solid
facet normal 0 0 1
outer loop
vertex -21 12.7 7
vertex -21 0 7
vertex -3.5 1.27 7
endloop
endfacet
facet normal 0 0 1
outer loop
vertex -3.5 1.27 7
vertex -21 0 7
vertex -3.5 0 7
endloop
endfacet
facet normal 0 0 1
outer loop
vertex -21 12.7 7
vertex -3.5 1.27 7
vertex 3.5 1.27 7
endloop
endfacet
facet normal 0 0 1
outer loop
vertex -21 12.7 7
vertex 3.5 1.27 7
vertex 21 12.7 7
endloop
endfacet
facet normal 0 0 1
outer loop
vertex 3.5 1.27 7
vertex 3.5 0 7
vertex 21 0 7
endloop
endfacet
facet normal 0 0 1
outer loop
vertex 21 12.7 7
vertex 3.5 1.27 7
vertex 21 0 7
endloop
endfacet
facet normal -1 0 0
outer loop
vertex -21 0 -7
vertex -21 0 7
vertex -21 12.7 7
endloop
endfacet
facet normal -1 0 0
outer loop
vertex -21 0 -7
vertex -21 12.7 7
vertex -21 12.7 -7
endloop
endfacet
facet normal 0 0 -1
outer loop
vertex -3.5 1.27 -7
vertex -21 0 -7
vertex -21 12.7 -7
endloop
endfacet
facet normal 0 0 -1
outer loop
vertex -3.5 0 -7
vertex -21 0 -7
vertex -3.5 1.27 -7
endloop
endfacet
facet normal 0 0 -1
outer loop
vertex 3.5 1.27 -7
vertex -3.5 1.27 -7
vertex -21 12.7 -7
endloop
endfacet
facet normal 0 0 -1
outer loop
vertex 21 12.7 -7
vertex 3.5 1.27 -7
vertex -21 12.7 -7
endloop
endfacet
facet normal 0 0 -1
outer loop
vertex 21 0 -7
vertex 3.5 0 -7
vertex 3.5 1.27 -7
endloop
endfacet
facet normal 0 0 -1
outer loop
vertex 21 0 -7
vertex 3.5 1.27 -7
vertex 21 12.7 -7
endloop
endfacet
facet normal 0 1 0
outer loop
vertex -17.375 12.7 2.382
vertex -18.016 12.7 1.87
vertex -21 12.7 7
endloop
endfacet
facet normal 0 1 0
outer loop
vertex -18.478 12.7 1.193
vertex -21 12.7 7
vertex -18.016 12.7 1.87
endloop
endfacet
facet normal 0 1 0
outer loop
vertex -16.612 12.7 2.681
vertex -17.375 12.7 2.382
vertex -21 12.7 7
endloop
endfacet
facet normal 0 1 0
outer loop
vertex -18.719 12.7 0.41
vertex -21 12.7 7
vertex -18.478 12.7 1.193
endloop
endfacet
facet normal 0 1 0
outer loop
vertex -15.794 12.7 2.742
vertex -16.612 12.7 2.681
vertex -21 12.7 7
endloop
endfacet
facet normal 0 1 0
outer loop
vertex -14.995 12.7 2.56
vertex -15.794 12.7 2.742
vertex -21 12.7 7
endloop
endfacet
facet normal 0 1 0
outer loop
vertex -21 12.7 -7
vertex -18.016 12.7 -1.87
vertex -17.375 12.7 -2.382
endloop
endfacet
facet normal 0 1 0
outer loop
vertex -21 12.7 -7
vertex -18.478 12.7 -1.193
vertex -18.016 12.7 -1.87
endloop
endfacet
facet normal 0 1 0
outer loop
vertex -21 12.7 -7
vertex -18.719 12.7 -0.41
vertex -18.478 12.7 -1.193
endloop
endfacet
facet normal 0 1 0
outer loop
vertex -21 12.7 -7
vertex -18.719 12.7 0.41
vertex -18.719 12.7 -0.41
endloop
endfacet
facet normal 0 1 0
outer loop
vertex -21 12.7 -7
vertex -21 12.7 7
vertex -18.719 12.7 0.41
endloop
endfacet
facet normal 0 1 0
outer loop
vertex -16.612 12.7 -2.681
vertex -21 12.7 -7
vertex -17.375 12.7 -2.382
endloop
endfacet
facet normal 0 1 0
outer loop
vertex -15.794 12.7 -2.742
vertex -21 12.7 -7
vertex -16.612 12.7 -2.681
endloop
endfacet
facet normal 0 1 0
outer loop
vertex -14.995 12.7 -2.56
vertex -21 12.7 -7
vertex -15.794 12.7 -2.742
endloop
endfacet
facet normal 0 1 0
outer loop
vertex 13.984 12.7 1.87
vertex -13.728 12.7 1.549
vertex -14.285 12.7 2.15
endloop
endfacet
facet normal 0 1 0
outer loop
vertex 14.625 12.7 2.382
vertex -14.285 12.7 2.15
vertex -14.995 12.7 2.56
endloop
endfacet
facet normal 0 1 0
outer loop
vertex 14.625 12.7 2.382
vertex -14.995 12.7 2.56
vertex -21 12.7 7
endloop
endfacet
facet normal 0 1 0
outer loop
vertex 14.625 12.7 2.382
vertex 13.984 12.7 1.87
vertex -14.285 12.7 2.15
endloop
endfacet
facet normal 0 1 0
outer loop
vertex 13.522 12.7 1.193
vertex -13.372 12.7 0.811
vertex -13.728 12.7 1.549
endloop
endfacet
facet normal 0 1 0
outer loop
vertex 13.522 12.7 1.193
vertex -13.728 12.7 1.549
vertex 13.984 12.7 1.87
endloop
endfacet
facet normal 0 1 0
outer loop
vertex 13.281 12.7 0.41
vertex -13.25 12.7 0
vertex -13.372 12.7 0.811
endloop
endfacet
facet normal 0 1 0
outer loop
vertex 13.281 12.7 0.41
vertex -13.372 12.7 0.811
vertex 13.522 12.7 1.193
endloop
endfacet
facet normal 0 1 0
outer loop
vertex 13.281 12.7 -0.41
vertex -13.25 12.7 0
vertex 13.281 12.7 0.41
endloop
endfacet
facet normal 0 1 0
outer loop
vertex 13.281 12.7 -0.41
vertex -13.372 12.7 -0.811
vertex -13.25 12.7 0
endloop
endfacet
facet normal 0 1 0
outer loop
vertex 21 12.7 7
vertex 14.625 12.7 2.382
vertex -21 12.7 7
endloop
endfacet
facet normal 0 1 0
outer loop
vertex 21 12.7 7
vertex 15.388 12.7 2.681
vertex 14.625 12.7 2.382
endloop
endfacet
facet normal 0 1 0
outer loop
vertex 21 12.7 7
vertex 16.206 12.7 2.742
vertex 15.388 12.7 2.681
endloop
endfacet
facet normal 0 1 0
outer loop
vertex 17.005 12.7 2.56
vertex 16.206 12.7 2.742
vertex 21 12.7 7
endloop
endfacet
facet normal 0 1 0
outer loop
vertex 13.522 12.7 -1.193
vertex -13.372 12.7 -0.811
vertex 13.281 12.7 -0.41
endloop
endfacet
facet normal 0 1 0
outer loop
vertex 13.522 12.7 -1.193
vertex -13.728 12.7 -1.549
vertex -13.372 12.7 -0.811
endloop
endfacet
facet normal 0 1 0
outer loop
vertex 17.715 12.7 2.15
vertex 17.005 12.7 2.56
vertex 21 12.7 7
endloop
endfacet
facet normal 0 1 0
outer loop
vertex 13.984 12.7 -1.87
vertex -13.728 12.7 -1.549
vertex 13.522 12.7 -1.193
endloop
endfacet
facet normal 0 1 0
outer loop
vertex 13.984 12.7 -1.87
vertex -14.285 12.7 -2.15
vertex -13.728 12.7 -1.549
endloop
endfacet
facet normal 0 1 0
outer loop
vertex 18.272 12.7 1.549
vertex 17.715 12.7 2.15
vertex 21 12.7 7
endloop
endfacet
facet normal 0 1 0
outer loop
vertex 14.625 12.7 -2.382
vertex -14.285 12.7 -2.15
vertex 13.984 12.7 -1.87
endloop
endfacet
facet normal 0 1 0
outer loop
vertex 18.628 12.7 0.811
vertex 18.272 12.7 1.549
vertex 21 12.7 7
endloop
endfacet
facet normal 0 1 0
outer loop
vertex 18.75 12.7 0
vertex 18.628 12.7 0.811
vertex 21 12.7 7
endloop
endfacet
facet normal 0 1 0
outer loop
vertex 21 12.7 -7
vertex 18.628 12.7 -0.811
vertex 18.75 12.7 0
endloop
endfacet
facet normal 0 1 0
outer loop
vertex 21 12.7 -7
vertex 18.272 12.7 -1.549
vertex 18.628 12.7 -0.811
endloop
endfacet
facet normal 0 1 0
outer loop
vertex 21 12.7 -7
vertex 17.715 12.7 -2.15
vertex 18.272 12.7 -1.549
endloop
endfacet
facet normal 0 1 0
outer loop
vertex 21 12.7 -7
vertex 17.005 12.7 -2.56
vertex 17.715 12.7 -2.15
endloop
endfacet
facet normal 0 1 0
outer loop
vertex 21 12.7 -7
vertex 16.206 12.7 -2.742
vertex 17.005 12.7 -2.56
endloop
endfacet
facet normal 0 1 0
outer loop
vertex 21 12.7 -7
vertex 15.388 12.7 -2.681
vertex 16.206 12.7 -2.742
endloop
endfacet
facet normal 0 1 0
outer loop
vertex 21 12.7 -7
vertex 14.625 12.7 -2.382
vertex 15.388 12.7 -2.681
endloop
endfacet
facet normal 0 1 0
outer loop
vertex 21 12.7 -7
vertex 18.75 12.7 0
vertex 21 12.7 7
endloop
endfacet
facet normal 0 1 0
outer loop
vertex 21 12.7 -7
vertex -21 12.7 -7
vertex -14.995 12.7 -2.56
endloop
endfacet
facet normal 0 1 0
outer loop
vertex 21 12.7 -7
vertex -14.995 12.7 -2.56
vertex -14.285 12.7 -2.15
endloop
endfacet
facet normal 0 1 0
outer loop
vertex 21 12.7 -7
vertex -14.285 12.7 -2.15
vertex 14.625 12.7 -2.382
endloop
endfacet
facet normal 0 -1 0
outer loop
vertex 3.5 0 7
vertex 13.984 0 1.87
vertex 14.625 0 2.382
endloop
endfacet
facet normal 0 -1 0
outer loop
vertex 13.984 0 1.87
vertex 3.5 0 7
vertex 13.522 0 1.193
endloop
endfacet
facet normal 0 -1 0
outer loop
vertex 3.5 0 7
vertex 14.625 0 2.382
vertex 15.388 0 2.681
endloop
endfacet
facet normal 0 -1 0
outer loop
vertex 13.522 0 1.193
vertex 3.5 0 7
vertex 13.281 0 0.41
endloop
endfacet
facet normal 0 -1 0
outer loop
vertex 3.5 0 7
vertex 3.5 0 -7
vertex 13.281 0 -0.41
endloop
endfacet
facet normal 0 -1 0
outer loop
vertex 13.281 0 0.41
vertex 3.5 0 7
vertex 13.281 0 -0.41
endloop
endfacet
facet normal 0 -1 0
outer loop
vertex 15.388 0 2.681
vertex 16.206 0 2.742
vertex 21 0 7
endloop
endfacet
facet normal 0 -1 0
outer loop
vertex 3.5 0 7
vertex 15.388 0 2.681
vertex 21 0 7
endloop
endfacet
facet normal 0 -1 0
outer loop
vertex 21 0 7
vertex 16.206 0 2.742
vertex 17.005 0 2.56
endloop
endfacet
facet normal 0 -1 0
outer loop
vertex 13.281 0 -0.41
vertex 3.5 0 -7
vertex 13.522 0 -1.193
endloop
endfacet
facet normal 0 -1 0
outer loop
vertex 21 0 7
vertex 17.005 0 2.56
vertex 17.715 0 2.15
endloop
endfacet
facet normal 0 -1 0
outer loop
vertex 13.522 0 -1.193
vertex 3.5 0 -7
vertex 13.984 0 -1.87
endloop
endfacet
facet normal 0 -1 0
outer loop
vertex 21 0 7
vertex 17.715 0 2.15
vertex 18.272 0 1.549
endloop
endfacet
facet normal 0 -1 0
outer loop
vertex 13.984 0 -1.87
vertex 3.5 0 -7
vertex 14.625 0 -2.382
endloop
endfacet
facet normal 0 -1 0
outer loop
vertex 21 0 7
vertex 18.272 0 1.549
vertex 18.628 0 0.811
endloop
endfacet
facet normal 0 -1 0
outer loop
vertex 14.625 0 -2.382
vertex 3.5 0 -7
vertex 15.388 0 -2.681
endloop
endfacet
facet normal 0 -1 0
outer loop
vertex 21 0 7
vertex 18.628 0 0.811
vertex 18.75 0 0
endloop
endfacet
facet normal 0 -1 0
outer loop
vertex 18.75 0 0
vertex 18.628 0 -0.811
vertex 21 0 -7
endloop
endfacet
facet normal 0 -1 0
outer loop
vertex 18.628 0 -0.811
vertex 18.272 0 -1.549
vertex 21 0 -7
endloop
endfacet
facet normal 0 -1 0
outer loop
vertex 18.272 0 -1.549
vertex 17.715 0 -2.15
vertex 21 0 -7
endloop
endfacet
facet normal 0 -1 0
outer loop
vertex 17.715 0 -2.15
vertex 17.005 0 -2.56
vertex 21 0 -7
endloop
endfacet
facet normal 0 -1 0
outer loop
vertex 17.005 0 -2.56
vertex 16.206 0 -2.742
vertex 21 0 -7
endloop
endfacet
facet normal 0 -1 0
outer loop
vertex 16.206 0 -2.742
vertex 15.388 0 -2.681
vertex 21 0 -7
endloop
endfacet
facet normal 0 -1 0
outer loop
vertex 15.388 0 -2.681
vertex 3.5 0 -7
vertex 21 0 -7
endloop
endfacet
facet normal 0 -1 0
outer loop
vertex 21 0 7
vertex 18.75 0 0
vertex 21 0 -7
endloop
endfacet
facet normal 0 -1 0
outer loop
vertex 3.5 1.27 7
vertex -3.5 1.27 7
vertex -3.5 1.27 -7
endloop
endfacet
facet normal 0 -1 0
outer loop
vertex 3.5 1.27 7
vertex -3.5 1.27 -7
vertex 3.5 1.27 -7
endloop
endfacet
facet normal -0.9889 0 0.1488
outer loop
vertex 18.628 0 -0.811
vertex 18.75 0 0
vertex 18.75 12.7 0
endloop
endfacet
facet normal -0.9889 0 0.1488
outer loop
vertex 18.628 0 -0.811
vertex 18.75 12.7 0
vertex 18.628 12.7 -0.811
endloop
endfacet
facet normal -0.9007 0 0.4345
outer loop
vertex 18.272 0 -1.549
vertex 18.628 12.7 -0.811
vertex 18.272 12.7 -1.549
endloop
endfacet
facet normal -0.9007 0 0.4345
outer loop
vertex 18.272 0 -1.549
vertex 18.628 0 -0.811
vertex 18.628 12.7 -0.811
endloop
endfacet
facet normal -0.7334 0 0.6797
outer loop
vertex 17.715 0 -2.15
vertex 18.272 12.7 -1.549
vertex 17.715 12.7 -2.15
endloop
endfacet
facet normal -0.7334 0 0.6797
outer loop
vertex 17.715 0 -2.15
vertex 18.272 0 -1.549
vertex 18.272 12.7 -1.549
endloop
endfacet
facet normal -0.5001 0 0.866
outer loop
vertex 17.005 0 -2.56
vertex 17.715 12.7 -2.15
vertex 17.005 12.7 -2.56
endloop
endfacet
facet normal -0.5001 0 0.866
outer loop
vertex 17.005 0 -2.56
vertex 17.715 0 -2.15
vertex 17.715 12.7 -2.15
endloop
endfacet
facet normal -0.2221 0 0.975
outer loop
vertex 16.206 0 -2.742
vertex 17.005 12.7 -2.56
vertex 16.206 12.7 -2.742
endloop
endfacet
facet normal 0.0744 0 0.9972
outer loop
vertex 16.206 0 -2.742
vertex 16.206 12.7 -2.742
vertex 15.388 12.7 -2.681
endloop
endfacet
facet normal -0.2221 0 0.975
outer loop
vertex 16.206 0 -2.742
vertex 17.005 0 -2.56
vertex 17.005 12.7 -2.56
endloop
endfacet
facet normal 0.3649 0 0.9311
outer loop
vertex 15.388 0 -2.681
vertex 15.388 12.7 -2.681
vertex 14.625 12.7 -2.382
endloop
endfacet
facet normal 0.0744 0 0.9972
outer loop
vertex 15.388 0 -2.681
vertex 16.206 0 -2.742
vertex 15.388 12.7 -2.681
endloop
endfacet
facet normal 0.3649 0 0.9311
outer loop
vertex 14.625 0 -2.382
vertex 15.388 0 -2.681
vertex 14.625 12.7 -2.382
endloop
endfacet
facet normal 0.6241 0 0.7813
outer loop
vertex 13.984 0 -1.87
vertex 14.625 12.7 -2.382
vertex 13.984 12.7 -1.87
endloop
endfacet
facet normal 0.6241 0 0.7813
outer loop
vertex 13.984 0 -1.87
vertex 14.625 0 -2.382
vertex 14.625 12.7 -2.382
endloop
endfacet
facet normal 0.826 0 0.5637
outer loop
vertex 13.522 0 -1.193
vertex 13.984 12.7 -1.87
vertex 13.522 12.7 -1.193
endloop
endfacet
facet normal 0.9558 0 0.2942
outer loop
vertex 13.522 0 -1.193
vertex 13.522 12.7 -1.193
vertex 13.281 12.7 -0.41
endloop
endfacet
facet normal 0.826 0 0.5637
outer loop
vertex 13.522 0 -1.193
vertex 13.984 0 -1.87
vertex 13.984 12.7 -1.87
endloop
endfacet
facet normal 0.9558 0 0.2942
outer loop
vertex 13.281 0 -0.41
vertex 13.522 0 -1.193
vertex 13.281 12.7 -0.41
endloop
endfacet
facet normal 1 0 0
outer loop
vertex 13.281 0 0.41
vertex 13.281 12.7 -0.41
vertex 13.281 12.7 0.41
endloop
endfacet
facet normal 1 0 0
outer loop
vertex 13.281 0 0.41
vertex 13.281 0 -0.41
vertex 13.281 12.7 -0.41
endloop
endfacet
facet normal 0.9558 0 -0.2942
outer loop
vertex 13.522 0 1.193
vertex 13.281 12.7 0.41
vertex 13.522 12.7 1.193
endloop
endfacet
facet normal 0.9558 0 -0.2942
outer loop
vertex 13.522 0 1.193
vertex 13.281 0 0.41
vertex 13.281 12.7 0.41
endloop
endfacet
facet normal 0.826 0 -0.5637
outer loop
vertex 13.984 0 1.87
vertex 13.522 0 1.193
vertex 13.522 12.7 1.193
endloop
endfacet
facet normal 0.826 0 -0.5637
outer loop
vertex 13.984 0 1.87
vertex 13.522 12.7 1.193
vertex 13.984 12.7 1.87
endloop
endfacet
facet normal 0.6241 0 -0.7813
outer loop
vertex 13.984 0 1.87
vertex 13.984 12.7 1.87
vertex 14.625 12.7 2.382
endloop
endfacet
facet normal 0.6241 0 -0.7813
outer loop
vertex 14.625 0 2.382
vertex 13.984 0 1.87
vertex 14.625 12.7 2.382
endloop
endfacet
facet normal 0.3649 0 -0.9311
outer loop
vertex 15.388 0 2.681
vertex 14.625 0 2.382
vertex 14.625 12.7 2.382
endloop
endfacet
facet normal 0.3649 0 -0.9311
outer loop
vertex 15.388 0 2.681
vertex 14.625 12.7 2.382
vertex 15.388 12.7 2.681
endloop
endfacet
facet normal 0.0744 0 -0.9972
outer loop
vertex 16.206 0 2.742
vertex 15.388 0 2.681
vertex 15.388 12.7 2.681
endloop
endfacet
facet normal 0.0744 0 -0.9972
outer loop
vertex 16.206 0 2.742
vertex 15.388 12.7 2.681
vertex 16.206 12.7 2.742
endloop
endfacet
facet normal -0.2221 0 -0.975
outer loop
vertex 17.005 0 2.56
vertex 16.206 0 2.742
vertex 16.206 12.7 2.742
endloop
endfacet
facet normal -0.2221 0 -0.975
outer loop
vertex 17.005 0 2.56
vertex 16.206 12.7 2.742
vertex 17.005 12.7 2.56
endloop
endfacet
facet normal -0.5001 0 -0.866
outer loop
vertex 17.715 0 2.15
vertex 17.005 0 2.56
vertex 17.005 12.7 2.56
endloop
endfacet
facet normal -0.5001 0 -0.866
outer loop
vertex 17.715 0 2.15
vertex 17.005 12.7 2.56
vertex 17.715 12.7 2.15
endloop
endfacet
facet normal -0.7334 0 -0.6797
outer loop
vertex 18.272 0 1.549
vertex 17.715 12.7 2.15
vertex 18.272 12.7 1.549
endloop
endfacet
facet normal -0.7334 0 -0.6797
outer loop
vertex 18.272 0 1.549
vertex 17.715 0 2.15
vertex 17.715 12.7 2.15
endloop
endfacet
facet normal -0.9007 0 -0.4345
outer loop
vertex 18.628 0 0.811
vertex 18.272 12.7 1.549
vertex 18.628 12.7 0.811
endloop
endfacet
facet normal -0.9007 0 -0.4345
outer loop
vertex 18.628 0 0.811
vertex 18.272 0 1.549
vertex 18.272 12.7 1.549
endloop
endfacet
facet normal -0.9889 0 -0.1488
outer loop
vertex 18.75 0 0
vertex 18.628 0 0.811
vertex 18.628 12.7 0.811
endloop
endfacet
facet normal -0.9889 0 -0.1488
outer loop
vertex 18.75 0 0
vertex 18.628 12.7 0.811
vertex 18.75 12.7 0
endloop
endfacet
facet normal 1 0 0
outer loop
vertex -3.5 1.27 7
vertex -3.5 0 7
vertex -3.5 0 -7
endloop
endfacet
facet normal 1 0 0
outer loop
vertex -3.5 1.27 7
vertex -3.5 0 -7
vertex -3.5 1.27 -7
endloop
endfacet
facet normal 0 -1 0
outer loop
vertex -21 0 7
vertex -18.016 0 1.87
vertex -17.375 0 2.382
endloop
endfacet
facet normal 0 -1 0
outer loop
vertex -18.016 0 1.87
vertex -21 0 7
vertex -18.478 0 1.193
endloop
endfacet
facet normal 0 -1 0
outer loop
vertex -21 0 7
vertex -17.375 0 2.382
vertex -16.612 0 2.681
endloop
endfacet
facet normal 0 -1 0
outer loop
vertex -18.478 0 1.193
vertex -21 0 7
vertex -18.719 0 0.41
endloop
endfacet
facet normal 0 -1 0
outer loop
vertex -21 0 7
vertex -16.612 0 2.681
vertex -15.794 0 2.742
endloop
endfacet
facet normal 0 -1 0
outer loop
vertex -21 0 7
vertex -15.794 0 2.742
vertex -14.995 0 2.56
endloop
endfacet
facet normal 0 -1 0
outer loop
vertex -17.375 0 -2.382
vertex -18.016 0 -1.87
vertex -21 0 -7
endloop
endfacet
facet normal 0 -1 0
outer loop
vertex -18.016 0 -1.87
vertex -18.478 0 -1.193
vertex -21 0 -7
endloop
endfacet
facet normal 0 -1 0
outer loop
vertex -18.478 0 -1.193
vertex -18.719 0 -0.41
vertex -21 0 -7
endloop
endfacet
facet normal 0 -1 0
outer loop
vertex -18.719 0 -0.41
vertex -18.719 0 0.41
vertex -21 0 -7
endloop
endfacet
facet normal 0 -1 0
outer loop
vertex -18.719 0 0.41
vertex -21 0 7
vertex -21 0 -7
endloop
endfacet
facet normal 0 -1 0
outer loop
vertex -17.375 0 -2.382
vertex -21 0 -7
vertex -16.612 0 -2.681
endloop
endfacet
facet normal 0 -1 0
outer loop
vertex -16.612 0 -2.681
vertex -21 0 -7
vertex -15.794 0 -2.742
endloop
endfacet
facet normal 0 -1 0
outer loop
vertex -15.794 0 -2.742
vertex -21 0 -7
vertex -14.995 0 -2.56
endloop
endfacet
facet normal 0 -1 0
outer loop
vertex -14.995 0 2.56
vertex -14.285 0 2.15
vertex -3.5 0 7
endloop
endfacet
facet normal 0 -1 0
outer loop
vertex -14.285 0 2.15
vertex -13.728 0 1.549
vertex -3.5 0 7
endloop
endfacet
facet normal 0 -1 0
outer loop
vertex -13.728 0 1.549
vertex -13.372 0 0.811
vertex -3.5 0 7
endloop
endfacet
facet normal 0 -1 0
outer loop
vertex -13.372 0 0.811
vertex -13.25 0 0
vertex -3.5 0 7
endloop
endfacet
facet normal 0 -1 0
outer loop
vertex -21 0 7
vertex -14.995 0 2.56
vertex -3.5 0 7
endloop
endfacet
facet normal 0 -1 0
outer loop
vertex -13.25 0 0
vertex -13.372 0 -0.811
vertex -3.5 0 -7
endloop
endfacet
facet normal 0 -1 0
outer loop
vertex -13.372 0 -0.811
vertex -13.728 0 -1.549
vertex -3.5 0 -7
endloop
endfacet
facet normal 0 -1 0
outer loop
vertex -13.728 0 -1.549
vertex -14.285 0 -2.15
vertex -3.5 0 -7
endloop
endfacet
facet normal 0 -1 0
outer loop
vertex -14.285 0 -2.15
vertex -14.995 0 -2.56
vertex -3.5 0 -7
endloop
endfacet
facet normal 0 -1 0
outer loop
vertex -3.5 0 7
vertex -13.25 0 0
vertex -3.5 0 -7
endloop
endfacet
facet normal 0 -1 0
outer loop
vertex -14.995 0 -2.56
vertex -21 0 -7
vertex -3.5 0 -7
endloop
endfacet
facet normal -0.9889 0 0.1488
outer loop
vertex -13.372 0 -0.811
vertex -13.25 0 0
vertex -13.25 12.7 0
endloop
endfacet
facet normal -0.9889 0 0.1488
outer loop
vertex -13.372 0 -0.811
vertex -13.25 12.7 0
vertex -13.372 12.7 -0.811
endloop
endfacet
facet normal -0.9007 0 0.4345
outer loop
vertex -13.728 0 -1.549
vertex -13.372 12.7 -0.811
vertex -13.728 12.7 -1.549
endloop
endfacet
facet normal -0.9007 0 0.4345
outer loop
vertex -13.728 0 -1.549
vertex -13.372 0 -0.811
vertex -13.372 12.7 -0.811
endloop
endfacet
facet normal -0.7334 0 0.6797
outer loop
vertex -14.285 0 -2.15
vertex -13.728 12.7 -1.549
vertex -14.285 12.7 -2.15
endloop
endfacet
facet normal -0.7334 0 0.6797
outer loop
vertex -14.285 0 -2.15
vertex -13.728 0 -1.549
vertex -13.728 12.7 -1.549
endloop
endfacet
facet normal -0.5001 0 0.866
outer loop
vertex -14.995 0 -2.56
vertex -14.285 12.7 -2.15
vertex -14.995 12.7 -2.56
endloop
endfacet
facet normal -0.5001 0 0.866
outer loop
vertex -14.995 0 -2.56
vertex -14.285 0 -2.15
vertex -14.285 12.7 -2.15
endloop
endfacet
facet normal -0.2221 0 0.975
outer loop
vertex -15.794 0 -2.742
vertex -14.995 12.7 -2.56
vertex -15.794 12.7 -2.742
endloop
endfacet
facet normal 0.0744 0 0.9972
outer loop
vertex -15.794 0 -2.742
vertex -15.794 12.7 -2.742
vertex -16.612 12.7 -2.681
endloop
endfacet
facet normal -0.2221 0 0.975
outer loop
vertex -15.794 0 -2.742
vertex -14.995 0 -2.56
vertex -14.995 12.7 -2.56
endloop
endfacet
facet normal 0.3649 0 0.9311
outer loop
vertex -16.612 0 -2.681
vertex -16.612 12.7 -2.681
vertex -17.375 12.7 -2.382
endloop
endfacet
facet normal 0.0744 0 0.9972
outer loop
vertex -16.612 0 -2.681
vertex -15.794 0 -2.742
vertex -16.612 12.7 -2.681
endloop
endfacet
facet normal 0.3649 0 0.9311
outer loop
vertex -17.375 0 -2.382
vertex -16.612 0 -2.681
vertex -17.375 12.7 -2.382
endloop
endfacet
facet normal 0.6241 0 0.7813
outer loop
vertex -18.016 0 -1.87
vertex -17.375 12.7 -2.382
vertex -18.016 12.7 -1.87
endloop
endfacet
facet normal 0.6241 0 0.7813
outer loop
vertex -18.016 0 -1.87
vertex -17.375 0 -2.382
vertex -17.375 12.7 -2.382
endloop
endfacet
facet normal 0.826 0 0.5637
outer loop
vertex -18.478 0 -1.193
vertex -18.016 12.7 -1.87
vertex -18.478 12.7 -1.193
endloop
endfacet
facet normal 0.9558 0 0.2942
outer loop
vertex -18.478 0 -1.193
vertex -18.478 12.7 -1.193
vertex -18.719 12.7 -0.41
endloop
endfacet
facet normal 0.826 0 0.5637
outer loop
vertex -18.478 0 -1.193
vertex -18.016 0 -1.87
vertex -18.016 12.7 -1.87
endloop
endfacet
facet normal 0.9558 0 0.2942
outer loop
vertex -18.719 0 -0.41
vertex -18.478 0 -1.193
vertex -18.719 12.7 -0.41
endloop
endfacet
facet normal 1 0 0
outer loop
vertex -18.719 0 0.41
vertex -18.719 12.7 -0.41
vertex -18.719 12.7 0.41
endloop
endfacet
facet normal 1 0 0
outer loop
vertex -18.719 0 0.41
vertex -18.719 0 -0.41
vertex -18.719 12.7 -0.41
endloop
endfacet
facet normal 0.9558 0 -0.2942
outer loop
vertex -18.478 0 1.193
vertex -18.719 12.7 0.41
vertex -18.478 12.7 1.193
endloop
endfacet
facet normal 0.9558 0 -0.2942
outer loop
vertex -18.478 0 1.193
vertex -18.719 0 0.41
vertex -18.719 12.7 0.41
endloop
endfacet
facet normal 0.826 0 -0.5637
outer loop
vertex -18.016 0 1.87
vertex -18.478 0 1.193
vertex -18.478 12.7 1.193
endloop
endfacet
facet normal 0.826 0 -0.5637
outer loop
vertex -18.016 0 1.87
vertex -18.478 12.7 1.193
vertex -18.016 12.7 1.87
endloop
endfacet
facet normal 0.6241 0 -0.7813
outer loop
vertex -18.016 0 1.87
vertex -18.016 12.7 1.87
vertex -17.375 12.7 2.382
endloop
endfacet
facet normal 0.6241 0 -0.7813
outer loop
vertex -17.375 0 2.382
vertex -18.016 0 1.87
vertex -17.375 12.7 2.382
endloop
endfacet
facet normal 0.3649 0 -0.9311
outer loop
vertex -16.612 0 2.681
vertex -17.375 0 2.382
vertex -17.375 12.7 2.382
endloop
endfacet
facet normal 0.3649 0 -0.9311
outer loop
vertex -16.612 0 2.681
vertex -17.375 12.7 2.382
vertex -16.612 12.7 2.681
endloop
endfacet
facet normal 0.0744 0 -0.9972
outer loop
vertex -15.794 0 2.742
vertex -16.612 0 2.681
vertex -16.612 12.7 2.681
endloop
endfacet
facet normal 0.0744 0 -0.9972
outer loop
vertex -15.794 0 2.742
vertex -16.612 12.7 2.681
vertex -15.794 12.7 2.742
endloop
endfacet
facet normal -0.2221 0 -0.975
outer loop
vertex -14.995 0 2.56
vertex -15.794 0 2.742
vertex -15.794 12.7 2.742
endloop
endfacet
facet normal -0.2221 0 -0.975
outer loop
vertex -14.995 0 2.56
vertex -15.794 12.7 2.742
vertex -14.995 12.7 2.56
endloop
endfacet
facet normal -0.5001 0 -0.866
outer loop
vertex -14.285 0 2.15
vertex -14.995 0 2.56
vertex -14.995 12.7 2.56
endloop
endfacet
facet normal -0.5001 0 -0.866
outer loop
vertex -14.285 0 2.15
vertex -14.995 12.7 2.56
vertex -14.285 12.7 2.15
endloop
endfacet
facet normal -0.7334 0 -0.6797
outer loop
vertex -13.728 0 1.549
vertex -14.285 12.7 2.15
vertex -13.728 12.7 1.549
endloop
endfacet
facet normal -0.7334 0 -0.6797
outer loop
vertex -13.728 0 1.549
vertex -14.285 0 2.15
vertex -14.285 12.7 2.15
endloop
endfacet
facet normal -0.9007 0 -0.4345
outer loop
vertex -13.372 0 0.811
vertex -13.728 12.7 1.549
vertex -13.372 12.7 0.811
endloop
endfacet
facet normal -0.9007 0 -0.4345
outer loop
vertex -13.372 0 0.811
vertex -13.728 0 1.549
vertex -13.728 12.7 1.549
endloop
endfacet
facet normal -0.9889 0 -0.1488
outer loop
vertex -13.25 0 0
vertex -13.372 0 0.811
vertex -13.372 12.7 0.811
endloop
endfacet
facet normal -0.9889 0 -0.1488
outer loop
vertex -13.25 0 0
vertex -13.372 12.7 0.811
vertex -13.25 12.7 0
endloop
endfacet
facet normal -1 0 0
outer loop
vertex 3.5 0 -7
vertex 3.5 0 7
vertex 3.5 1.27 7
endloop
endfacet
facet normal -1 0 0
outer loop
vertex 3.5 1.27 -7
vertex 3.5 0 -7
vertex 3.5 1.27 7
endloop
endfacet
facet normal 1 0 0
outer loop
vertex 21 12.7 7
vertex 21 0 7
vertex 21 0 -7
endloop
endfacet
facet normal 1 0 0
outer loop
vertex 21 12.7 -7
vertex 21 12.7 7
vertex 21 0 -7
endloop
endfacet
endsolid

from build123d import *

# Parameters (mm, degrees)
SKETCH1_W           = 42
SKETCH1_H           = 14
SKETCH1_R           = 2.75
BOSS_EXTRUDE1_DEPTH = 12.7
SKETCH2_W           = 7
SKETCH2_H           = 1.27
CUT_EXTRUDE1_DEPTH  = 14


with BuildPart() as part:
    # Sketch1 → Boss-Extrude1 (new body)
    with BuildSketch(Plane(origin=(0, 0, 0), x_dir=(1, 0, 0), z_dir=(0, 1, 0))):
        Rectangle(SKETCH1_W, SKETCH1_H)
        with Locations((-16, 0)):
            Circle(SKETCH1_R, mode=Mode.SUBTRACT)
        with Locations((16, 0)):
            Circle(SKETCH1_R, mode=Mode.SUBTRACT)
    extrude(amount=BOSS_EXTRUDE1_DEPTH)

    # Sketch2 → Cut-Extrude1 (cut)
    with BuildSketch(Plane.XY.offset(7)):
        with Locations((0, 0.635)):
            Rectangle(SKETCH2_W, SKETCH2_H)
    extrude(amount=-CUT_EXTRUDE1_DEPTH, mode=Mode.SUBTRACT)


solid = part.part
